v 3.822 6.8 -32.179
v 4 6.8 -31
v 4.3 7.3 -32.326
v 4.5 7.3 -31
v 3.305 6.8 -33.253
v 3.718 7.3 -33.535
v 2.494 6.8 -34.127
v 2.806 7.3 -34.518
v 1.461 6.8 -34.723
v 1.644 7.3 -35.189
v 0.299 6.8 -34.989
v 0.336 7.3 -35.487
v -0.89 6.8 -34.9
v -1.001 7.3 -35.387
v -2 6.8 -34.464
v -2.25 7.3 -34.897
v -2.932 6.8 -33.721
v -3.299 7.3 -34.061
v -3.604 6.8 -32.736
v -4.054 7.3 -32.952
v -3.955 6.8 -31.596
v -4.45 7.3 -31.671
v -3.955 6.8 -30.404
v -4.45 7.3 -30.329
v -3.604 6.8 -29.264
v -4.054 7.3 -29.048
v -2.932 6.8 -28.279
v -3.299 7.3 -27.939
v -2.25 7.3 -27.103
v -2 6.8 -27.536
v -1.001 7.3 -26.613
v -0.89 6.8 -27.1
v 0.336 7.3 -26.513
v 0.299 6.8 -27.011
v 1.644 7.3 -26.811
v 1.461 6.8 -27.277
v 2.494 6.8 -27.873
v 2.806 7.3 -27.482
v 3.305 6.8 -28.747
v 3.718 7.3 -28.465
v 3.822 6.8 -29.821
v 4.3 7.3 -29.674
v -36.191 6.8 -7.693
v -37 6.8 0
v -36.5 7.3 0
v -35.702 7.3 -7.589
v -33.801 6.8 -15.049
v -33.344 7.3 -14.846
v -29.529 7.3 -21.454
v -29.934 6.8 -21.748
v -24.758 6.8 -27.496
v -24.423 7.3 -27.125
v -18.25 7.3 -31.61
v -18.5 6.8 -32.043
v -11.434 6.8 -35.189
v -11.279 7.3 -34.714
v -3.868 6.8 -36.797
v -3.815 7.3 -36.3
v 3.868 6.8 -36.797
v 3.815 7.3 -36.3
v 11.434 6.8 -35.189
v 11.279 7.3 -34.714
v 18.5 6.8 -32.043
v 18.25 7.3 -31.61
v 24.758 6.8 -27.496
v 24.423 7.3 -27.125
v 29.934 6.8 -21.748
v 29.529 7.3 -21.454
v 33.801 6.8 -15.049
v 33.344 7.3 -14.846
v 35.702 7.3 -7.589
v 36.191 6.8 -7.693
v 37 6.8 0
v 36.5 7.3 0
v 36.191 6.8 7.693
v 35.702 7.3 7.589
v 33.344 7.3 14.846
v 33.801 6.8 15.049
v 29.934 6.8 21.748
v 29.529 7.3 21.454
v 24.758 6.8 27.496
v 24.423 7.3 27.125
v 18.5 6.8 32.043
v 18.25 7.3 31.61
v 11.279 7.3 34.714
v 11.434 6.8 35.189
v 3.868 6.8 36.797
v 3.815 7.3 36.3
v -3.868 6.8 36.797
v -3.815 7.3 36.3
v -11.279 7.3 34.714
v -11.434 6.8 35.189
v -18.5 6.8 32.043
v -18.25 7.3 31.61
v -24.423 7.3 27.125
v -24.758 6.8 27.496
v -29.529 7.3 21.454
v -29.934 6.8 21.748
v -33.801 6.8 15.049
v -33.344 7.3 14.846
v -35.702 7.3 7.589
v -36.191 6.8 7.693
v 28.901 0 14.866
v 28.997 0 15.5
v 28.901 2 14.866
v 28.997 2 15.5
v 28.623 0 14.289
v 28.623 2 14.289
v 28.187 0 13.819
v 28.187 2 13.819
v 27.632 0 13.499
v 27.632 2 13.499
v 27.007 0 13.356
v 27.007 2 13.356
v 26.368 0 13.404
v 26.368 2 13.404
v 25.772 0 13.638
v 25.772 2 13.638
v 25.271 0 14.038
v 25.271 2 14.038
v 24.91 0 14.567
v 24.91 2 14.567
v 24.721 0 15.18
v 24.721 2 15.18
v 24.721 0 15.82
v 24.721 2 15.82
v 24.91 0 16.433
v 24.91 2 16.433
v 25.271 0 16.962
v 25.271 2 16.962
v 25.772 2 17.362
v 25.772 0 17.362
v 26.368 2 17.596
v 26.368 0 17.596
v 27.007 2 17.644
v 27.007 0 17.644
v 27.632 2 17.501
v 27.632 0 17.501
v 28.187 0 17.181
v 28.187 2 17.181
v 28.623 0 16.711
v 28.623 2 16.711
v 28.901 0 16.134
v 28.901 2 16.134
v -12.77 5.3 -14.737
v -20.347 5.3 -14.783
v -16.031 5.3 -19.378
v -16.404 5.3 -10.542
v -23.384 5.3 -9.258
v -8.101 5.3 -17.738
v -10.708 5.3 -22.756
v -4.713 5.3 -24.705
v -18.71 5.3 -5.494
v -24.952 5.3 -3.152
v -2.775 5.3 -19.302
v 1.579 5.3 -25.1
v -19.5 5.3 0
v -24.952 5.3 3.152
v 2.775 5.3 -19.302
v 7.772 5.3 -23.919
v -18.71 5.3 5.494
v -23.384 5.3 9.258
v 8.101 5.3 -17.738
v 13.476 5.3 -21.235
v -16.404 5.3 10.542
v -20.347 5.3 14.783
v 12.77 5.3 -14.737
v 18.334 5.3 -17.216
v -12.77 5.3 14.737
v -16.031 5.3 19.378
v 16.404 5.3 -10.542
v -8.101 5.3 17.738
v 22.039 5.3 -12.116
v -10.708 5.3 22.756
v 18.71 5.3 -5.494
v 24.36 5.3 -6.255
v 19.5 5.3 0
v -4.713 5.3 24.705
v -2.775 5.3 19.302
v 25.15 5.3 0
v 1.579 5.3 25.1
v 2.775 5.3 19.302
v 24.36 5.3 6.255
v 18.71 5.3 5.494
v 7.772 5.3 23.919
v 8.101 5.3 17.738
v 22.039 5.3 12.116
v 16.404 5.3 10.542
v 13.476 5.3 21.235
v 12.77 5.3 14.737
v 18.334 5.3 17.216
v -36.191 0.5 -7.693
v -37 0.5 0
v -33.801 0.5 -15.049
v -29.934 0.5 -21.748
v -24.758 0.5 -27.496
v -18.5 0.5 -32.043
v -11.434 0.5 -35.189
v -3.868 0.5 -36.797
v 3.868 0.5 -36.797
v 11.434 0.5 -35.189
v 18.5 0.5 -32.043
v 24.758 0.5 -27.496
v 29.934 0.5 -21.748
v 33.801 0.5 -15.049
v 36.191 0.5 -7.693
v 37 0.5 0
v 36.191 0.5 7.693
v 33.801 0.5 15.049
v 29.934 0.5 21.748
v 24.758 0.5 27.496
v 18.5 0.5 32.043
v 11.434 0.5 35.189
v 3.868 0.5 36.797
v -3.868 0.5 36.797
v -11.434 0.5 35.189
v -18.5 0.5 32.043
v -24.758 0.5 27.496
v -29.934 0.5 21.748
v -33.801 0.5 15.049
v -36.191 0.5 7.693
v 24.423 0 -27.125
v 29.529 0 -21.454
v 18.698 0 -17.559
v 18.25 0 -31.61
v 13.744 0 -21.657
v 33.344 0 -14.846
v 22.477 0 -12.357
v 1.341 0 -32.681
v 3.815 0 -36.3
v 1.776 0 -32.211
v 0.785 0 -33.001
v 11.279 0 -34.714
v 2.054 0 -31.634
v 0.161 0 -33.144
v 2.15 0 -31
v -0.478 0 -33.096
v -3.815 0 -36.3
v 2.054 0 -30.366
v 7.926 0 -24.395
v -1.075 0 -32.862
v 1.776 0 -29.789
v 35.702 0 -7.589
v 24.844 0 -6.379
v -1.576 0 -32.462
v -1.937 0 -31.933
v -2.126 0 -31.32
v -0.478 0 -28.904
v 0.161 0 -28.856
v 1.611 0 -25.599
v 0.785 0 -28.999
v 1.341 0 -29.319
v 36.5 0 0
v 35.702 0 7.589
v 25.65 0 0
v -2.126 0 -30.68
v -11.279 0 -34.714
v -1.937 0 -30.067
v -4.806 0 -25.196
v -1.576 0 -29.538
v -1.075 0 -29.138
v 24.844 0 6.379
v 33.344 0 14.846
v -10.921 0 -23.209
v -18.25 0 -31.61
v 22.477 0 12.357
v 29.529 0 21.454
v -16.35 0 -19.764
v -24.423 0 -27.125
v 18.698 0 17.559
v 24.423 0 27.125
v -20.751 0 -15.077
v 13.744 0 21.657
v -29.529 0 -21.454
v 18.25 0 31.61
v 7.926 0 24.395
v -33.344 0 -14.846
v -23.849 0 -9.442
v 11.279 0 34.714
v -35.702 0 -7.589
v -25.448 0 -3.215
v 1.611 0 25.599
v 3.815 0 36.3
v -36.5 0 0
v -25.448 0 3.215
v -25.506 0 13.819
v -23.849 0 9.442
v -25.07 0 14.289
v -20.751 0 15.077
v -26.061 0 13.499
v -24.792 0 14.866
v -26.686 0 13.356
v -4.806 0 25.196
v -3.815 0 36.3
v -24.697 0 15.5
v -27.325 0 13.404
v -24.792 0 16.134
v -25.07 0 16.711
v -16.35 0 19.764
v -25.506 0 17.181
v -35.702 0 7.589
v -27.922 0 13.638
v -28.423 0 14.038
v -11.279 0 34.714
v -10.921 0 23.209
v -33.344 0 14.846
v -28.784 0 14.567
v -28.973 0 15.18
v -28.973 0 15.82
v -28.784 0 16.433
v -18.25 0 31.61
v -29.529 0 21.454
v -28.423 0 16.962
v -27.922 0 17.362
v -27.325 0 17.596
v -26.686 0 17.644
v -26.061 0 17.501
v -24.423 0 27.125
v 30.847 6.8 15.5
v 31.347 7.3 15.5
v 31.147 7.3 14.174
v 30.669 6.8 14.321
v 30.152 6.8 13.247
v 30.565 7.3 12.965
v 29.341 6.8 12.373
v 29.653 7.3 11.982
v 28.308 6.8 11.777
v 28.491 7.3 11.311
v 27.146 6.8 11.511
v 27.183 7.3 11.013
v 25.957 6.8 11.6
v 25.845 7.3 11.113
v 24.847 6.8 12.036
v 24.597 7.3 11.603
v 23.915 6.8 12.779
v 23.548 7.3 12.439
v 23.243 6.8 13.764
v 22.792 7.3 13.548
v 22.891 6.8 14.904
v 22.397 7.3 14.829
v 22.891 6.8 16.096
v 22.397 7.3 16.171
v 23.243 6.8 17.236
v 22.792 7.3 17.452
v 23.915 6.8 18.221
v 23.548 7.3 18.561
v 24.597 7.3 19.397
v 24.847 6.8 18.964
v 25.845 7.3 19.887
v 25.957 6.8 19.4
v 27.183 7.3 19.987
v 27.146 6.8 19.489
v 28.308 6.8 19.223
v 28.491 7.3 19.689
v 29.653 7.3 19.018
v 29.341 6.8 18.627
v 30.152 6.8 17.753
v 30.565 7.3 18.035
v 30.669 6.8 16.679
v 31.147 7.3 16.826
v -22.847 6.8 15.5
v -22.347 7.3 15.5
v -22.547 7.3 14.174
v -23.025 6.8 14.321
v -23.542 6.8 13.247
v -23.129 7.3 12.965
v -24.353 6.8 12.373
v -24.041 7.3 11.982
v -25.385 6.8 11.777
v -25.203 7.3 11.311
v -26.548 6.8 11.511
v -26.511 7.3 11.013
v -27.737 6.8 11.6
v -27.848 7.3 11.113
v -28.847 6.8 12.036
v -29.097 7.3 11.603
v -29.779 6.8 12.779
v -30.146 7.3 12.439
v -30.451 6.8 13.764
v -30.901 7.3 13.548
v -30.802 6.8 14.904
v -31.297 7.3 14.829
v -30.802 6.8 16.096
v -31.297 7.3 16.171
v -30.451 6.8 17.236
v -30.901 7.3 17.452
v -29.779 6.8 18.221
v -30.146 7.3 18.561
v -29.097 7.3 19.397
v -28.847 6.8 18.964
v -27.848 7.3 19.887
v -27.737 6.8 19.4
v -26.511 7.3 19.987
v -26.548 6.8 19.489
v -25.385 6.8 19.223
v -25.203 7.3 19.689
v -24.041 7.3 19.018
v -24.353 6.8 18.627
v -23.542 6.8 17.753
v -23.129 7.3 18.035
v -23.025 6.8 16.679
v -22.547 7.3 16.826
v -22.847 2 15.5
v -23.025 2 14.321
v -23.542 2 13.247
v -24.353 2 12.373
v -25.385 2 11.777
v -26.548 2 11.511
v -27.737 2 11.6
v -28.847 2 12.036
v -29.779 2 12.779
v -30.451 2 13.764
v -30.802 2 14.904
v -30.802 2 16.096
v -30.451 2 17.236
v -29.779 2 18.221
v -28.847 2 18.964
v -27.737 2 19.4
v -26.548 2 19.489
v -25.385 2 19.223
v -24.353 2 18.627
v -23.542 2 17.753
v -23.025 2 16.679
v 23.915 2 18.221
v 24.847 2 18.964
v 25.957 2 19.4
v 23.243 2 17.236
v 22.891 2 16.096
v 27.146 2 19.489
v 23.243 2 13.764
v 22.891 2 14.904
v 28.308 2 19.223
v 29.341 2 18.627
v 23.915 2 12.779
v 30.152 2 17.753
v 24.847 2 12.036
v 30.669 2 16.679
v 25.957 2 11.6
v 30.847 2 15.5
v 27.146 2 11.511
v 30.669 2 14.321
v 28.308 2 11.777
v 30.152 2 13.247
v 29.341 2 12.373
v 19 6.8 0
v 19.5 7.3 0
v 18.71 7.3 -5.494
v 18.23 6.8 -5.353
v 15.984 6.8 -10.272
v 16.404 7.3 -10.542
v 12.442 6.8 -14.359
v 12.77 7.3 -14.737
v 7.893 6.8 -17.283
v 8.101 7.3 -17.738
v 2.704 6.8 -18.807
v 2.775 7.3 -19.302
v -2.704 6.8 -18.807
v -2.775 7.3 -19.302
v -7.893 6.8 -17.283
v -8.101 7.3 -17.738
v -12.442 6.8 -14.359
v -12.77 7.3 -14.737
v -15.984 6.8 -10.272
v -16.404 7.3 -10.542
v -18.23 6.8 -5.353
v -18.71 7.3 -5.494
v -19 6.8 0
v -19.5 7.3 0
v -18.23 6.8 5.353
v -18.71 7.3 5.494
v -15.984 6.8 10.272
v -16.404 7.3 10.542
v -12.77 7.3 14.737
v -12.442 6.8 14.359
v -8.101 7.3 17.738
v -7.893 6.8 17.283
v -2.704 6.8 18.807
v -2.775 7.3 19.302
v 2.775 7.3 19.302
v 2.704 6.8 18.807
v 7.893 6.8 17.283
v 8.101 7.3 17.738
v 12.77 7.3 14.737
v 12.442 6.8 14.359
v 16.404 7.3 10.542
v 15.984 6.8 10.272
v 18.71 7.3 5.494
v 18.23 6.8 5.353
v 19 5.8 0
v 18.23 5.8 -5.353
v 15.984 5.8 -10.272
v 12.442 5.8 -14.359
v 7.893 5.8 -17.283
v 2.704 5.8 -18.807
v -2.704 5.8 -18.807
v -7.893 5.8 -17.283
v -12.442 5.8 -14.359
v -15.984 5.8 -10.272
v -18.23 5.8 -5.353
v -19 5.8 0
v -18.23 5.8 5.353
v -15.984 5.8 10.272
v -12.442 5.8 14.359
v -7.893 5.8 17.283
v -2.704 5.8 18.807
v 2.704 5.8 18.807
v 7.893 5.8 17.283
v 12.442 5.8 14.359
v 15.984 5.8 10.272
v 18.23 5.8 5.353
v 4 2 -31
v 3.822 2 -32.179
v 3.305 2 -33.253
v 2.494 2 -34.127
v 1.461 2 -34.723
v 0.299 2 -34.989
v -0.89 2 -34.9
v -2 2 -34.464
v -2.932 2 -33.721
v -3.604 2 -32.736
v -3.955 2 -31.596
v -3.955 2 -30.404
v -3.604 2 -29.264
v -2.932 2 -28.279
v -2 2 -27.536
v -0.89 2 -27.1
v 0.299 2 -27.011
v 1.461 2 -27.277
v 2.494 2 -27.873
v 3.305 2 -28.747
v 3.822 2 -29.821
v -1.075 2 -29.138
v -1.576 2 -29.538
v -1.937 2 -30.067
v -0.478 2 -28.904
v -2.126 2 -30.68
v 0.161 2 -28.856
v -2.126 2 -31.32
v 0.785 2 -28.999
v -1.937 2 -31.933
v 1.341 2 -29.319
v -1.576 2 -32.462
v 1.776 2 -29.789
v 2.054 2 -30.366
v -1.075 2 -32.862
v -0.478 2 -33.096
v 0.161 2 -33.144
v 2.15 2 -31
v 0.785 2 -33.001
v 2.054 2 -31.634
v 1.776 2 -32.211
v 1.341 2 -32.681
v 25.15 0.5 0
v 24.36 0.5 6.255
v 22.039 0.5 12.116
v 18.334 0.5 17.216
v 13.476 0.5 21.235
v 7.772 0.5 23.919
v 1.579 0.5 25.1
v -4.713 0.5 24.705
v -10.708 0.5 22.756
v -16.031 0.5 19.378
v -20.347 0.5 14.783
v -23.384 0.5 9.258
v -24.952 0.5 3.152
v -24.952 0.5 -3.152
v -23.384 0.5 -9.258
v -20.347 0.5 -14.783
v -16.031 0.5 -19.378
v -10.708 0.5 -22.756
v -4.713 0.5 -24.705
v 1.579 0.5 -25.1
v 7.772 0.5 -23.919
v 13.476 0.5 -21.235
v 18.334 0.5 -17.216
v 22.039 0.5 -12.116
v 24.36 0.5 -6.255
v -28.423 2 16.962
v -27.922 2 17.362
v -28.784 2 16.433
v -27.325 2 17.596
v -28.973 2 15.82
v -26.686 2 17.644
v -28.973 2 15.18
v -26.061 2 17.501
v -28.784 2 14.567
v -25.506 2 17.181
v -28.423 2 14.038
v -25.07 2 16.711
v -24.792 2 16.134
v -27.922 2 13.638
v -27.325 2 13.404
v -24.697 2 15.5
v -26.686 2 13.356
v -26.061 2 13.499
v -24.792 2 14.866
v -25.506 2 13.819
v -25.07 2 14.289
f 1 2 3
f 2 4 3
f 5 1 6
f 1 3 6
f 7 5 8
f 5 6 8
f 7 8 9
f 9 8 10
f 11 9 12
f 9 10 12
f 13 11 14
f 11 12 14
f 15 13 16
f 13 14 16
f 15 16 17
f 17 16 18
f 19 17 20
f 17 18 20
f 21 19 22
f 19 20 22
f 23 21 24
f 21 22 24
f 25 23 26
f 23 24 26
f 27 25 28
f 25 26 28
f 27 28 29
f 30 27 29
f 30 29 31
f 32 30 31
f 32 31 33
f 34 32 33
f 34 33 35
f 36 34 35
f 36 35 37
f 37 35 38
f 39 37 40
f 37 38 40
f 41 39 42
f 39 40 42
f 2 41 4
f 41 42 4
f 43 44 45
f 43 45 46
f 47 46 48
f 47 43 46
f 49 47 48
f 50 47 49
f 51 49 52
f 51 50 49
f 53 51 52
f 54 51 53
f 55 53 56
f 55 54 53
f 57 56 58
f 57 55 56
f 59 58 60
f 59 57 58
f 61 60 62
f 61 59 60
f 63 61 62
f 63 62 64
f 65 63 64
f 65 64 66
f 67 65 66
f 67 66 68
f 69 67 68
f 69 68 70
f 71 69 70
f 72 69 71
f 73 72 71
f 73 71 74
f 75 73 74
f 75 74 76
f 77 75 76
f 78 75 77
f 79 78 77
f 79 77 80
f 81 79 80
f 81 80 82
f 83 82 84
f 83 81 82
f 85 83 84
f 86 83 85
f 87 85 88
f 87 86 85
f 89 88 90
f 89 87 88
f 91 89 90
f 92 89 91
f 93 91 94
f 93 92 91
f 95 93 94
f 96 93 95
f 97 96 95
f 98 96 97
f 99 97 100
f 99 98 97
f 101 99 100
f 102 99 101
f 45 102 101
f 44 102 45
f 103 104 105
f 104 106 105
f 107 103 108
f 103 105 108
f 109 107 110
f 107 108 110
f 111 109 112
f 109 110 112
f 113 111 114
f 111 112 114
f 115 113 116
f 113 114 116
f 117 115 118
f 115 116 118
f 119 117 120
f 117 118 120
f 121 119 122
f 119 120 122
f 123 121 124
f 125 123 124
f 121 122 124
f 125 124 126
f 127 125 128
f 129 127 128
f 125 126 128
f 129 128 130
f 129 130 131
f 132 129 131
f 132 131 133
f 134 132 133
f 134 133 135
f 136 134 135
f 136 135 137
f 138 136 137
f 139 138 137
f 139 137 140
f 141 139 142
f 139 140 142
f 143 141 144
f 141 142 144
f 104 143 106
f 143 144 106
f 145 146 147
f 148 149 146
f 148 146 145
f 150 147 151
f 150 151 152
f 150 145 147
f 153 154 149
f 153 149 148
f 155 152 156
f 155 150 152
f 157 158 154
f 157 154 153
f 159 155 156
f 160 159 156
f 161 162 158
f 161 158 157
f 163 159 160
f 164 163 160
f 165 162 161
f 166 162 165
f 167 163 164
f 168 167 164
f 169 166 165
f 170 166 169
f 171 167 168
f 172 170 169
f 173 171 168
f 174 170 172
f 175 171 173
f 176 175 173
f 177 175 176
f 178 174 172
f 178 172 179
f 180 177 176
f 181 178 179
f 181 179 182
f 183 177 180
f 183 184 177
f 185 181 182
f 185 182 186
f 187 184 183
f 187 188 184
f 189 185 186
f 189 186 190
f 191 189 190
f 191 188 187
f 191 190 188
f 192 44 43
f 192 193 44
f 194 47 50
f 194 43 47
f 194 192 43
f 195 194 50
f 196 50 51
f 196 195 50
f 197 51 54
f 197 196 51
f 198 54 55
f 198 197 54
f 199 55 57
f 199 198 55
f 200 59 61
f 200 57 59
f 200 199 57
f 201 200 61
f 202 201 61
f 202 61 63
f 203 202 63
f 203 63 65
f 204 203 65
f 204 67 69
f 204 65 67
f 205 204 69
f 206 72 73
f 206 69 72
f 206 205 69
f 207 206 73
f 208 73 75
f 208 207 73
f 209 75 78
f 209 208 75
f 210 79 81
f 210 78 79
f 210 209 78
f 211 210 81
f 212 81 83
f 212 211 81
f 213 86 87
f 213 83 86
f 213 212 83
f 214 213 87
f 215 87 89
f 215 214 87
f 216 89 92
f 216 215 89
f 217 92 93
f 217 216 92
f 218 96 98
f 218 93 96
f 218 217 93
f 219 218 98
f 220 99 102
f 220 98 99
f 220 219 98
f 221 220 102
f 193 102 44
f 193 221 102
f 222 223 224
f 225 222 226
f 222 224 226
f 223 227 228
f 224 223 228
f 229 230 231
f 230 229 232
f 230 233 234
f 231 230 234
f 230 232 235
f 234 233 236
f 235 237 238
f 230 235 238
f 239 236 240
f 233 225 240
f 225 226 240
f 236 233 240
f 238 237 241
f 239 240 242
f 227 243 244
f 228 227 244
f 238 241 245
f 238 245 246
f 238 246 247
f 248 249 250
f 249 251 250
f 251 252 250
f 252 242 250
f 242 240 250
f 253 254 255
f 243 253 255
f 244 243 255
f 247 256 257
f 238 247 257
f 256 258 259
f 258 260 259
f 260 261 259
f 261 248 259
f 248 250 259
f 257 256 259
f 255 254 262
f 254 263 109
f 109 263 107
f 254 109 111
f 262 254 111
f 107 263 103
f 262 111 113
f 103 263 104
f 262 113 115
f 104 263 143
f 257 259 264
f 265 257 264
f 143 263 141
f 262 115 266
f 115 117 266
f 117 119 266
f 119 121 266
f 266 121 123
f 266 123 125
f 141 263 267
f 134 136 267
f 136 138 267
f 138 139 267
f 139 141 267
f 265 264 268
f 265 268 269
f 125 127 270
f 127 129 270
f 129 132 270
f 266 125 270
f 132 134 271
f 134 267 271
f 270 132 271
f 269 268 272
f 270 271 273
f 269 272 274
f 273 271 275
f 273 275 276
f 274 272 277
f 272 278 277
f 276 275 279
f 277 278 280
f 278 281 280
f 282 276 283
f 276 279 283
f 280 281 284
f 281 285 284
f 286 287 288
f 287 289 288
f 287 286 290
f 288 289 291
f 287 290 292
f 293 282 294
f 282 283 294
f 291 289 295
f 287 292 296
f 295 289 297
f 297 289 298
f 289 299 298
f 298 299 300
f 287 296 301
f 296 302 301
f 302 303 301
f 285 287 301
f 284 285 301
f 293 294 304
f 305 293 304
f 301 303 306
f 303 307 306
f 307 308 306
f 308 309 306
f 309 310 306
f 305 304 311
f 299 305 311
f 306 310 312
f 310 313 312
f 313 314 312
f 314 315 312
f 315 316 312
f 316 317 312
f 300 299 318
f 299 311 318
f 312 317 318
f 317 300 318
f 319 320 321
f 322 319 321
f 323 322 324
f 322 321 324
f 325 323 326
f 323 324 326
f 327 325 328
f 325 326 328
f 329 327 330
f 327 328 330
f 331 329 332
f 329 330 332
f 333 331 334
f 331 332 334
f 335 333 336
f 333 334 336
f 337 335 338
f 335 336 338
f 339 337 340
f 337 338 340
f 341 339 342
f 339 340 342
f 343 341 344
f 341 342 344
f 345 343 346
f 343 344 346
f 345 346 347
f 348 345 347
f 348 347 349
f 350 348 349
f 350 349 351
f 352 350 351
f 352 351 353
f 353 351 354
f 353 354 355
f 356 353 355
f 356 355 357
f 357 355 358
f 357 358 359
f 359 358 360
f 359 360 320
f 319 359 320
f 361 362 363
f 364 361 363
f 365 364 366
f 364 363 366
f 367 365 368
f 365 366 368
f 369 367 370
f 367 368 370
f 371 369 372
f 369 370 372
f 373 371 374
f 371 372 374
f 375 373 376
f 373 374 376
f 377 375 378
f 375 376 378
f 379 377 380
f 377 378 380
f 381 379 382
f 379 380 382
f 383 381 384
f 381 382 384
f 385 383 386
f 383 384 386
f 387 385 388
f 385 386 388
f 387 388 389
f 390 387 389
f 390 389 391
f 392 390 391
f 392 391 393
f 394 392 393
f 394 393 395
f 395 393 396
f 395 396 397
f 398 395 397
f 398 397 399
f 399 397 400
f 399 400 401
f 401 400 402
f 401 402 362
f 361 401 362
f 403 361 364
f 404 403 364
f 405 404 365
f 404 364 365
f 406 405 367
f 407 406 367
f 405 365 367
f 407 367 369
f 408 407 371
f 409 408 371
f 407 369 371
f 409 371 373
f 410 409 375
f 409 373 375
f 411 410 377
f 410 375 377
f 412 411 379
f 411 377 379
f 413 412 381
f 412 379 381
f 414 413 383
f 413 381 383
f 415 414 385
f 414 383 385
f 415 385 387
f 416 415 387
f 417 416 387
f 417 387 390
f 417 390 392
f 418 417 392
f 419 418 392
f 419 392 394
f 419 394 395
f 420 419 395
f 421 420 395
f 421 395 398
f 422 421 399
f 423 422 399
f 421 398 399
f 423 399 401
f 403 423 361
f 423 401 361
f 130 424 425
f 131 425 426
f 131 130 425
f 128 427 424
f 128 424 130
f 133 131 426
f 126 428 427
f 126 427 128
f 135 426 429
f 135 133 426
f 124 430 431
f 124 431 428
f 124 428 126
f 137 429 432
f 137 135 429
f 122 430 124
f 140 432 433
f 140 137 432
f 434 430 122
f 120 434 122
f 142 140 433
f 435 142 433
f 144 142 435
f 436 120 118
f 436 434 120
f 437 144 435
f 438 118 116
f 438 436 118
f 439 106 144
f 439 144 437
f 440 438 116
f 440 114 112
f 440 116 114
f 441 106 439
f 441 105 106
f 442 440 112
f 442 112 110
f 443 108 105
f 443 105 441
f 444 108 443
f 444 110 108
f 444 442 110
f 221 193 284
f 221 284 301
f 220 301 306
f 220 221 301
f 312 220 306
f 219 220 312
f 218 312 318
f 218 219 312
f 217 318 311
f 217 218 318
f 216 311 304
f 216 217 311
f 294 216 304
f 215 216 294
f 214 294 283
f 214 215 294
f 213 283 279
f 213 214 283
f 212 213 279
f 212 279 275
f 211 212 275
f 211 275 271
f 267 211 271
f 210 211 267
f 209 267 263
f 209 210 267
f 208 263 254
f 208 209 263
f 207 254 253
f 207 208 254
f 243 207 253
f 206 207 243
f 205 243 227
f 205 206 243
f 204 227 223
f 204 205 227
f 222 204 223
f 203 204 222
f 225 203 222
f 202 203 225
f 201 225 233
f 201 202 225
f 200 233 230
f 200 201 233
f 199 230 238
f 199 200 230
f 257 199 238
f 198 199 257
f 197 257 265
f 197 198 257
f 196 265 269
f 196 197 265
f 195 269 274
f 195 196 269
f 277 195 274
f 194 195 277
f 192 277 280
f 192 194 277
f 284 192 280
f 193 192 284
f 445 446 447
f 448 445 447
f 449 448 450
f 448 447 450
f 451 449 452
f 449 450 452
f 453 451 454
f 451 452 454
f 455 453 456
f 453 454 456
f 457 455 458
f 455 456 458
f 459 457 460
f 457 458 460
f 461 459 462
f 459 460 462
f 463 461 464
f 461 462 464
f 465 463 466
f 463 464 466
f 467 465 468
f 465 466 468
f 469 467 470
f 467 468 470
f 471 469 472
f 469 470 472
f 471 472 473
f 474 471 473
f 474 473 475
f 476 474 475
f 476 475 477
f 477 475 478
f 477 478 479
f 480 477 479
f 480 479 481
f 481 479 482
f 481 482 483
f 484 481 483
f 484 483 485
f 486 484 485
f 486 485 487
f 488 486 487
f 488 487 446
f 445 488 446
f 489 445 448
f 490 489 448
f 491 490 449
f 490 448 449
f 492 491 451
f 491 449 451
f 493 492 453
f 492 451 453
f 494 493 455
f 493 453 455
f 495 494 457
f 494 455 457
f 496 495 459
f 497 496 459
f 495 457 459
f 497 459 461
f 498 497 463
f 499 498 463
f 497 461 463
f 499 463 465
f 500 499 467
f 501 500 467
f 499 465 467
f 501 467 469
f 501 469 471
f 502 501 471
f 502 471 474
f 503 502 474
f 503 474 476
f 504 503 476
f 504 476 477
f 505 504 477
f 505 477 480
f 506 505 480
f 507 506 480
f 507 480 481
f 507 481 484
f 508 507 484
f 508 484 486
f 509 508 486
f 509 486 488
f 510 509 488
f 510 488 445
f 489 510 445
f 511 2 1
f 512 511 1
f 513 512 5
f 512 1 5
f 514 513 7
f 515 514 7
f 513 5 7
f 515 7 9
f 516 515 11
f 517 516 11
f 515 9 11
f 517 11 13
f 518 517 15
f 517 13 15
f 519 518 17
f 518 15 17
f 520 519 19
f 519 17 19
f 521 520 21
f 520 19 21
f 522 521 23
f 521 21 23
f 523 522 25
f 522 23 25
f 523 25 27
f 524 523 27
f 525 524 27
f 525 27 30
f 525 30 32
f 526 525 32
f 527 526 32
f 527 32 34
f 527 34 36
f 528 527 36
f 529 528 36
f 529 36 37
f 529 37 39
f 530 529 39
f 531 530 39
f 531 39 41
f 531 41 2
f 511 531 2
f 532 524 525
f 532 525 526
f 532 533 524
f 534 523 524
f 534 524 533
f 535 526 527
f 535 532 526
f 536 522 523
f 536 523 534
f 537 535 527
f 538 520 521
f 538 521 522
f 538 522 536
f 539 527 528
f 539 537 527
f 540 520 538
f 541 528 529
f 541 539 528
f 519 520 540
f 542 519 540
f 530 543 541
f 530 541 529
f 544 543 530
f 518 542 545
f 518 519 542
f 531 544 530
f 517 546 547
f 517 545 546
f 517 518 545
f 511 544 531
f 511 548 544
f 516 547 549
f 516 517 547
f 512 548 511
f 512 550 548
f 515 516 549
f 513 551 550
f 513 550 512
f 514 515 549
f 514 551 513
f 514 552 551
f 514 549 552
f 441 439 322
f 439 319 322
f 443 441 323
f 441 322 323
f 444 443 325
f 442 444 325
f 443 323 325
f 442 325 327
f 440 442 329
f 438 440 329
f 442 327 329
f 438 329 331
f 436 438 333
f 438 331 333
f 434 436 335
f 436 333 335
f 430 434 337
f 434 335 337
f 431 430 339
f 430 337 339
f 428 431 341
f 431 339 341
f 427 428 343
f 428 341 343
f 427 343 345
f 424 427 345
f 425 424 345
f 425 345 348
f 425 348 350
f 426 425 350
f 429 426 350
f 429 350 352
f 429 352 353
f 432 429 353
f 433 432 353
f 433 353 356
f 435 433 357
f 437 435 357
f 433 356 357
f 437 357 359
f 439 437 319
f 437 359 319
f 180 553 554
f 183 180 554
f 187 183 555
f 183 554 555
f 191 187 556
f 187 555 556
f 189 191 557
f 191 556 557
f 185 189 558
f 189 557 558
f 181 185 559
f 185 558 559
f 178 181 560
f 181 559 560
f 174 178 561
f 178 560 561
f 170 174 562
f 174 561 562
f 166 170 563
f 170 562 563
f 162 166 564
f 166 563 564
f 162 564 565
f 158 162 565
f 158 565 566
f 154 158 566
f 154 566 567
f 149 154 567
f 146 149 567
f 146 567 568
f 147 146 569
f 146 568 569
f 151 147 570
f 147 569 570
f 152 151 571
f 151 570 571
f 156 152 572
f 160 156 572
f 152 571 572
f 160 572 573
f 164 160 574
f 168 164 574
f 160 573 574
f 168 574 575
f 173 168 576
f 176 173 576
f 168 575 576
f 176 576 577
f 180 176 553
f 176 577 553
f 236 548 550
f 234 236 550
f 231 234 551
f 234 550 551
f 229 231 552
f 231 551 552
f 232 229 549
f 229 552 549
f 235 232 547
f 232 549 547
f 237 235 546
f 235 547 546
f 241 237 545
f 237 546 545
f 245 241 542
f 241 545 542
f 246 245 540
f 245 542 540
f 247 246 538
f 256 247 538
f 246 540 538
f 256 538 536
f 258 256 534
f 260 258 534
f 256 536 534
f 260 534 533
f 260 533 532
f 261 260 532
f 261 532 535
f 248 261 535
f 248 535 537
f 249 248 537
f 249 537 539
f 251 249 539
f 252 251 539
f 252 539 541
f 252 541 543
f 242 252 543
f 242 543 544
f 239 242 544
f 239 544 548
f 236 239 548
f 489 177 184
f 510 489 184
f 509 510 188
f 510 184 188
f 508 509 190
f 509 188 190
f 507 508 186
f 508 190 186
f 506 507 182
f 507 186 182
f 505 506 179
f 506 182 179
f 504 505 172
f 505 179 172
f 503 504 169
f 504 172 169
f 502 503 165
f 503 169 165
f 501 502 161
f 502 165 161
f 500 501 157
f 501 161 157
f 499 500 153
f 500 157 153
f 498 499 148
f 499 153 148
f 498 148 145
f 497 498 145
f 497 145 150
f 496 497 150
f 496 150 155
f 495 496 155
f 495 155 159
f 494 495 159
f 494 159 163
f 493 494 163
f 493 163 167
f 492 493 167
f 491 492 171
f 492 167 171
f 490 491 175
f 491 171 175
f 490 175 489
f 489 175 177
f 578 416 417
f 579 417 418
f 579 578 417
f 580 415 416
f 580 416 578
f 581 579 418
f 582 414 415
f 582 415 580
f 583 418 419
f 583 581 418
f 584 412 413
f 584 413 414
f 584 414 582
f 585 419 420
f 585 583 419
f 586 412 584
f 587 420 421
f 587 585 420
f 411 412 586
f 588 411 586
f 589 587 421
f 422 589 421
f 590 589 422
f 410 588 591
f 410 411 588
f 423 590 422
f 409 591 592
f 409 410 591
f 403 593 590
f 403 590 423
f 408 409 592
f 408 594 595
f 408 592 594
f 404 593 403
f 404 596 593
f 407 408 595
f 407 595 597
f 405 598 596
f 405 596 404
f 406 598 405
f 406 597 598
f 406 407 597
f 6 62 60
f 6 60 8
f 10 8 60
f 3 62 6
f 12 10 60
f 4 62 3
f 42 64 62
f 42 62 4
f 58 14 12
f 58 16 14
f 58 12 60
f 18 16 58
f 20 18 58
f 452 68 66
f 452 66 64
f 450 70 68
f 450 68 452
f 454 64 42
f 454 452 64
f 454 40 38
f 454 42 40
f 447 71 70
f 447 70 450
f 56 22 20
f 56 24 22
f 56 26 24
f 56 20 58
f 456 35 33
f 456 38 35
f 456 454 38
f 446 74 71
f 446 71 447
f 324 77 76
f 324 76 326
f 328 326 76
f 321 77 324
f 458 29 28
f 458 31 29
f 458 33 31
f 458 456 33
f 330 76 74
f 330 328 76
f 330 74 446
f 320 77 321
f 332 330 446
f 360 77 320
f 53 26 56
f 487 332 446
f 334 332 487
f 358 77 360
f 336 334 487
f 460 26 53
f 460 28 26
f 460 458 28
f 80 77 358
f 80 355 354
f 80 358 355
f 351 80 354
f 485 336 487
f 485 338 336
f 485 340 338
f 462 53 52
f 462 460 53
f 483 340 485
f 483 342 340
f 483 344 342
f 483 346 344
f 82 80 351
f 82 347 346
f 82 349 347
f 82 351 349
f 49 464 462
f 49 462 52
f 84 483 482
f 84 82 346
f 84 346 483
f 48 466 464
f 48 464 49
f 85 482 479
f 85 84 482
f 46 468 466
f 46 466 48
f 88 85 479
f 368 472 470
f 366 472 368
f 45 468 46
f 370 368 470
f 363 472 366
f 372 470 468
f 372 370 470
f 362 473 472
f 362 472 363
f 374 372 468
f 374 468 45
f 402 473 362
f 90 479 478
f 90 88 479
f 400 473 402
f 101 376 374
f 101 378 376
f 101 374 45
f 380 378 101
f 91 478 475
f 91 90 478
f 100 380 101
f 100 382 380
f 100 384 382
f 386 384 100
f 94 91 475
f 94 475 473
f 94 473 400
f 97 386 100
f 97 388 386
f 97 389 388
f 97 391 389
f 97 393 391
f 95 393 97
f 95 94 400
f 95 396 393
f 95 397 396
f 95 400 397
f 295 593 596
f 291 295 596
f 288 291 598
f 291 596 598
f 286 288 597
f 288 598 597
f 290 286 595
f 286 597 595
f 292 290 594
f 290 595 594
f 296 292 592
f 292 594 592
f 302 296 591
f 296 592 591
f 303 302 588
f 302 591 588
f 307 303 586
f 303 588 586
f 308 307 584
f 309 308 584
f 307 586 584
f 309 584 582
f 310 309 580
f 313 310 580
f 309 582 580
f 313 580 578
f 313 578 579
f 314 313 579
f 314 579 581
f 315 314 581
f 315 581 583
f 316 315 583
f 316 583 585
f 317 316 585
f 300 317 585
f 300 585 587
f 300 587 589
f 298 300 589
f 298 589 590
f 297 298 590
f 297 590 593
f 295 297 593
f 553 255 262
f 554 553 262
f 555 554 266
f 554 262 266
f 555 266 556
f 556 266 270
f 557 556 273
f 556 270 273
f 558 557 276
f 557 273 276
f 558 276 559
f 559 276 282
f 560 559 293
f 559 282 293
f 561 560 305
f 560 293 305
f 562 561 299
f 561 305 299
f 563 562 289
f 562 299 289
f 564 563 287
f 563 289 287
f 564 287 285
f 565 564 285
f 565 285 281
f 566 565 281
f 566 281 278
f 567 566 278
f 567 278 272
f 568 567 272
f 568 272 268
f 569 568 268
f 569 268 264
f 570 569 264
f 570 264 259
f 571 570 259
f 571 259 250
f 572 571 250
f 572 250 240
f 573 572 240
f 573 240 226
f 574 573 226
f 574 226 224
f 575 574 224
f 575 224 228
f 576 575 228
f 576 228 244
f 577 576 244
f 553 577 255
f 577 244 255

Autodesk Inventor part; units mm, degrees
ref_plane "YZ Plane" through (0, 0, 0) normal (1, 0, 0) x (0, 1, 0)
ref_plane "XZ Plane" through (0, 0, 0) normal (0, 1, 0) x (-1, 0, 0)
ref_plane "XY Plane" through (0, 0, 0) normal (0, 0, 1) x (1, 0, 0)
sketch "スケッチ1" plane through (0, 0, 0) normal (0, 1, 0) x (-1, 0, 0)
  circle A0 centre (0, 0) radius 37
  dimension "d0" = 74
extrude "押し出し1" add sketch "スケッチ1" along normal blind 7.3
sketch "スケッチ2" plane through (0, 7.3, 0) normal (0, 1, 0) x (1, 0, 0)
  circle A0 centre (0, 0) radius 19
  dimension "d3" = 38
extrude "押し出し2" cut sketch "スケッチ2" against normal through all
sketch "スケッチ3" plane through (0, 0, 0) normal (0, -1, 0) x (1, 0, 0)
  circle A0 centre (0, 0) radius 25.15
  dimension "d6" = 50.3
extrude "押し出し3" cut sketch "スケッチ3" against normal blind 5.3
sketch "スケッチ6" plane through (0, 7.3, 0) normal (0, 1, 0) x (1, 0, 0)
  circle A0 centre (0, 31) radius 2.15
  circle A1 centre (-26.8468, -15.5) radius 2.15
  circle A2 centre (26.8468, -15.5) radius 2.15
  point P0 (0, 0)
  dimension "d21" = 4.3
  dimension "d22" = 31
  dimension "d25" = 360
extrude "押し出し6" cut sketch "スケッチ6" against normal through all
sketch "スケッチ7" plane through (0, 7.3, 0) normal (0, 1, 0) x (1, 0, 0)
  circle A0 centre (0, 31) radius 2.15 projected
  circle A1 centre (0, 31) radius 4
  circle A2 centre (-26.8468, -15.5) radius 4
  circle A3 centre (26.8468, -15.5) radius 4
  point P0 (0, 0)
  dimension "d29" = 8
  dimension "d32" = 360
extrude "押し出し7" cut sketch "スケッチ7" against normal blind 5.3 contours A0 | A1 | A2 | A3
chamfer "面取り1" distance 0.5 angle 45 8 edges at (37, 7.3, 0) (37, 0, 0) (-25.15, 0, 0) (-19, 7.3, 0) (-19, 5.3, 0) (22.8468, 7.3, 15.5) (-30.8468, 7.3, 15.5) (-4, 7.3, -31)
properties part number "clamp_for_bearing" material "ステンレス鋼"
